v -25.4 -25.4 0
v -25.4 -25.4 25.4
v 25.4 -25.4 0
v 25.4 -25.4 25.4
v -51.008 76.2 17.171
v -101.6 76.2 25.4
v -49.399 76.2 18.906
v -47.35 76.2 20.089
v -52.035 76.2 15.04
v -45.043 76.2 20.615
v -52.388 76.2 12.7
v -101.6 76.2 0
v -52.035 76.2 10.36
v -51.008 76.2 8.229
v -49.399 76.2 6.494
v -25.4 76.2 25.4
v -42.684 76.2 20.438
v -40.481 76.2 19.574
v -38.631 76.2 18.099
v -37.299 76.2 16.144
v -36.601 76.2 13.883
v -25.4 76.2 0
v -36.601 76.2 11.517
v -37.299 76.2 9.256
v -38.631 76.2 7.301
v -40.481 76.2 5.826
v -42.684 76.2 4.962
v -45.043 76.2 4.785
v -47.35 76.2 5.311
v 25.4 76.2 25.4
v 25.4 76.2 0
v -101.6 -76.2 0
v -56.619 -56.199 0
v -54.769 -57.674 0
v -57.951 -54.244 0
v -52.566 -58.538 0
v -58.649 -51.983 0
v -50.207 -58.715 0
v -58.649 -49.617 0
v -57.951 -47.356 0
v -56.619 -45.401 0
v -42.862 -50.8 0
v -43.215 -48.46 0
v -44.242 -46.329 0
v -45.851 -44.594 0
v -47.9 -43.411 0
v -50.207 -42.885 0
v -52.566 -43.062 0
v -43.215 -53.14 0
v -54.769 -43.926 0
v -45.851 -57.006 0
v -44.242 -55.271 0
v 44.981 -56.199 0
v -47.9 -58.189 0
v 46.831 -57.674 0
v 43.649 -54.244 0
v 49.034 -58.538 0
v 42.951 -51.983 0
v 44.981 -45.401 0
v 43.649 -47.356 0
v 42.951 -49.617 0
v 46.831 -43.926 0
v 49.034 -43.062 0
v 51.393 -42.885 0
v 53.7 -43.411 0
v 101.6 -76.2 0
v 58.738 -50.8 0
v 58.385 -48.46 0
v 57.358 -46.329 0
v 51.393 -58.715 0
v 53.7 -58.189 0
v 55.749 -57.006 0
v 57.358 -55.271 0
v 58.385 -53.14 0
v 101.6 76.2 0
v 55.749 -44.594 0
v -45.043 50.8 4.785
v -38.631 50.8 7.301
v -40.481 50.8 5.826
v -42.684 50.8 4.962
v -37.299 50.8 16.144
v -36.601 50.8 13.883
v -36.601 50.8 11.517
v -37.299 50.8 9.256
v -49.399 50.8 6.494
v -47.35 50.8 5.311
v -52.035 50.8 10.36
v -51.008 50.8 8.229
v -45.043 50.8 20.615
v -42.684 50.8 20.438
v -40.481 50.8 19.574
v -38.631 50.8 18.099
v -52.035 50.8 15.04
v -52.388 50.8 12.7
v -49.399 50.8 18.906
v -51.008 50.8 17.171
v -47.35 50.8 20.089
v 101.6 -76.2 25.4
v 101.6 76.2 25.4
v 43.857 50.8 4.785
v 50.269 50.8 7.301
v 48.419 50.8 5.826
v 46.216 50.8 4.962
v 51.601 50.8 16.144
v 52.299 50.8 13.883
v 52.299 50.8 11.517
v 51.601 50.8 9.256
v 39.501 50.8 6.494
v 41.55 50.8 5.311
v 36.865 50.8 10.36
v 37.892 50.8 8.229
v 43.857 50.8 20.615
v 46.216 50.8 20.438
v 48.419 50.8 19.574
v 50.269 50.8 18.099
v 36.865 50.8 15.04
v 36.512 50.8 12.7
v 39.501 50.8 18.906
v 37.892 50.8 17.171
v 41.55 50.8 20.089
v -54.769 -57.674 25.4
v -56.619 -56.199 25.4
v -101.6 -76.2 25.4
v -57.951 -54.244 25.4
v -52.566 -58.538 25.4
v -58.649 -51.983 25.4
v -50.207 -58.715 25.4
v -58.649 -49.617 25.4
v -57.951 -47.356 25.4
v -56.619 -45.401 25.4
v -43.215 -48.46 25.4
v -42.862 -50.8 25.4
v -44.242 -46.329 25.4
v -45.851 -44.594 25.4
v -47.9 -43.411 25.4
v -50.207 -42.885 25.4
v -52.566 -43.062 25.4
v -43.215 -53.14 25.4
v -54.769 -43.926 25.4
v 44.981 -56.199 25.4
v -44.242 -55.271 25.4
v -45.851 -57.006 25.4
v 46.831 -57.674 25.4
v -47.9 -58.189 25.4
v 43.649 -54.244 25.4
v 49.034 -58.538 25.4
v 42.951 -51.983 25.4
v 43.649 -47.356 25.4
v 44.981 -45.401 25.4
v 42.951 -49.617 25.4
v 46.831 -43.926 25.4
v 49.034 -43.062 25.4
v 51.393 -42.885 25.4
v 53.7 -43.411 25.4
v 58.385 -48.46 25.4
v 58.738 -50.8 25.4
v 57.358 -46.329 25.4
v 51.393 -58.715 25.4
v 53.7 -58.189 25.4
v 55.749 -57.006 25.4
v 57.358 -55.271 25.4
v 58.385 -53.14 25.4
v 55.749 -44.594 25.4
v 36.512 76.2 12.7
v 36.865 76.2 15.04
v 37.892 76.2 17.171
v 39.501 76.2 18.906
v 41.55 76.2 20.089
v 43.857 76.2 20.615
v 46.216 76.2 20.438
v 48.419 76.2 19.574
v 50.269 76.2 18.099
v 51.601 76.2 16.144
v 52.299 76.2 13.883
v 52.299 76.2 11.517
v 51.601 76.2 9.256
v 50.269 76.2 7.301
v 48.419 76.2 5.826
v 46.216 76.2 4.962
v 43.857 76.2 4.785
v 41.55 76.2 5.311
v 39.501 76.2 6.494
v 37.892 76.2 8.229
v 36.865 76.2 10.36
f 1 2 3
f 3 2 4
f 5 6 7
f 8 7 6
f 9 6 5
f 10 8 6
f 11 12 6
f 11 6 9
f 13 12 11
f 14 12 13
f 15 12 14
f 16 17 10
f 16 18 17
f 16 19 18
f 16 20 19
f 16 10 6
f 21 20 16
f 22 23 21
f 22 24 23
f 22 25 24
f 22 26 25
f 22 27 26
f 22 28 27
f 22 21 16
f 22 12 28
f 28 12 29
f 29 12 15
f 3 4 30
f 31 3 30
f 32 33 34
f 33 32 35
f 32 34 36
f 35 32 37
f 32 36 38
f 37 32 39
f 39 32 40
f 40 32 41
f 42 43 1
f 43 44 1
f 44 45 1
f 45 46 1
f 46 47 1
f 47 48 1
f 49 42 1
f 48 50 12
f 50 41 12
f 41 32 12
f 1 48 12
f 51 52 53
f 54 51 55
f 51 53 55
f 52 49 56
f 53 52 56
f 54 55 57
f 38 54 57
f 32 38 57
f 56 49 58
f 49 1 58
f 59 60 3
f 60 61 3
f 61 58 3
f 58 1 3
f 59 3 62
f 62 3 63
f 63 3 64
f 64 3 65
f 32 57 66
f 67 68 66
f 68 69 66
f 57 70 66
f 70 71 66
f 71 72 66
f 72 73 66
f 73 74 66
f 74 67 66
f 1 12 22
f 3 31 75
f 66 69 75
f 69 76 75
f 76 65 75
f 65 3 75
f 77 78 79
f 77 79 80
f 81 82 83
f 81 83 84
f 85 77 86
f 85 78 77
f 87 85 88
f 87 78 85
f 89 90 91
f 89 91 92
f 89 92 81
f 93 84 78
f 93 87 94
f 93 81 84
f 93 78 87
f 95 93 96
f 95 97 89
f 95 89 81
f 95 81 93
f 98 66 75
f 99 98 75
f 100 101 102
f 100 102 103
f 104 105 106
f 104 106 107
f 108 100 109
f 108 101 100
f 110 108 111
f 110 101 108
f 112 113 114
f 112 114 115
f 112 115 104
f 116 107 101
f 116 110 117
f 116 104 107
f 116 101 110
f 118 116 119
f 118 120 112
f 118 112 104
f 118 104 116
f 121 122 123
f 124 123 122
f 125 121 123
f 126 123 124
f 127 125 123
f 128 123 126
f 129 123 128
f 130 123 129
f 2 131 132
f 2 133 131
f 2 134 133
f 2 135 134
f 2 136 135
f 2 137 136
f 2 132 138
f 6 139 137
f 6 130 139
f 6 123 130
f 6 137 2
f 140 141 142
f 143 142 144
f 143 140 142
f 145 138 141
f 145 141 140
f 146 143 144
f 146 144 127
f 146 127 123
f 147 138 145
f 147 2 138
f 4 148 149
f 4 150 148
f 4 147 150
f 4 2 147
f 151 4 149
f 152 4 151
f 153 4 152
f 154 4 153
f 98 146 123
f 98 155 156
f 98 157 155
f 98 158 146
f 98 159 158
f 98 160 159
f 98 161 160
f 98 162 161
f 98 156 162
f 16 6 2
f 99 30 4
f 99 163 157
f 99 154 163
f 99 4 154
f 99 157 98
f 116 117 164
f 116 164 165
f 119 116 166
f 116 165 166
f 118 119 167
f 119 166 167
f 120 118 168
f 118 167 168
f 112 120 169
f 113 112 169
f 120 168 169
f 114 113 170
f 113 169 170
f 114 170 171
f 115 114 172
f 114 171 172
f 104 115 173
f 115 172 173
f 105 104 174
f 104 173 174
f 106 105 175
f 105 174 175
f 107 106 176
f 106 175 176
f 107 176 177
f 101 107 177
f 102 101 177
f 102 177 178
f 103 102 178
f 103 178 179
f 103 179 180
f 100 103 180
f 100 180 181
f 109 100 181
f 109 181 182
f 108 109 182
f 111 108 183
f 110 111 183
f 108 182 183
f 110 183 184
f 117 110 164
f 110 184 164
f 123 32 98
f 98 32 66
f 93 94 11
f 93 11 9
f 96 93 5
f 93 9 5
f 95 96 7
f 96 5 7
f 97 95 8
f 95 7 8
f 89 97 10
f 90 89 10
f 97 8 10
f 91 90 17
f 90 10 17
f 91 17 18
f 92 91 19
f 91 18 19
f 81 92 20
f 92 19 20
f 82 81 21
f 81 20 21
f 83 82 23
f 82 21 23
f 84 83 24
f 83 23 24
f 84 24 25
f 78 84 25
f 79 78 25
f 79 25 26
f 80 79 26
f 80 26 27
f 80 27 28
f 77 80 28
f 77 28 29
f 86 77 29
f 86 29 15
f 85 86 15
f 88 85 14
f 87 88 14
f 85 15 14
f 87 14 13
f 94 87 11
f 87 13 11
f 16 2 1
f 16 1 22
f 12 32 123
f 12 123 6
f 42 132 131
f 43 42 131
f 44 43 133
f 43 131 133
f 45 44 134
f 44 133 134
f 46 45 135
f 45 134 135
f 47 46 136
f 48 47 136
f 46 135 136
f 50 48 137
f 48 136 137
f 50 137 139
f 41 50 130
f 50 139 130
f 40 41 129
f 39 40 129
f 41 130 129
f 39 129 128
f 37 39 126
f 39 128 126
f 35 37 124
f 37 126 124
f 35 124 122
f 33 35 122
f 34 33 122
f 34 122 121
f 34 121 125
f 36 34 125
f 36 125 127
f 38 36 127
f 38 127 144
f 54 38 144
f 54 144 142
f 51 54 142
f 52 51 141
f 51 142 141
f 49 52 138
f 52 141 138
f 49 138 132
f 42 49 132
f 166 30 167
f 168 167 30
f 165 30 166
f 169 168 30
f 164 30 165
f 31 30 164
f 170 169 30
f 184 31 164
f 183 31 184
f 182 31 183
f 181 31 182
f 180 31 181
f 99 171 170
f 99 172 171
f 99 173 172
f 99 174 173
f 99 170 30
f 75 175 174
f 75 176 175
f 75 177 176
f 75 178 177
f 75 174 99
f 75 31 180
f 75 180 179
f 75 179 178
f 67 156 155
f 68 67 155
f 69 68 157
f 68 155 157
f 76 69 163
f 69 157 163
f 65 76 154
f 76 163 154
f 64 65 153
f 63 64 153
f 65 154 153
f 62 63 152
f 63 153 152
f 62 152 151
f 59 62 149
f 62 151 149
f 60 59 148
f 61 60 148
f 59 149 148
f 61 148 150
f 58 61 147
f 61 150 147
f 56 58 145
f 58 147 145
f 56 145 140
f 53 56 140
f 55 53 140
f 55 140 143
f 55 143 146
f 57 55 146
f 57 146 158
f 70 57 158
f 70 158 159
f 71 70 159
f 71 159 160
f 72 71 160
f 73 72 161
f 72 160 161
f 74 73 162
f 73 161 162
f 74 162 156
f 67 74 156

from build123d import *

# Parameters (mm, degrees)
F0_W     = 203.2
F0_H     = 152.4
F0_R     = 7.9375
F1_DEPTH = 25.4
F2_W     = 50.8
F2_H     = 203.2
F3_DEPTH = 50.8
F4_R     = 7.9375
F5_DEPTH = 25.4
F6_R     = 7.9375
F7_DEPTH = 25.4


with BuildPart() as f1:
    # F0 (on Top) → F1 (new body)
    with BuildSketch(Plane.XY):
        Rectangle(F0_W, F0_H)
        Circle(F0_R, mode=Mode.SUBTRACT)
    extrude(amount=F1_DEPTH)

    # F2 (on face) → F3 (cut)
    with BuildSketch(Plane.XY.offset(25.4)):
        with Locations((0, 76.2)):
            Rectangle(F2_W, F2_H)
    extrude(amount=-F3_DEPTH, mode=Mode.SUBTRACT)

    # F4 (on face) → F5 (cut)
    with BuildSketch(Plane.XY.offset(25.4)):
        with Locations((-50.8, -50.8)):
            Circle(F4_R)
        with Locations((50.8, -50.8)):
            Circle(F4_R)
    extrude(amount=-F5_DEPTH, mode=Mode.SUBTRACT)

    # F6 (on face) → F7 (cut)
    with BuildSketch(Plane(origin=(0, 76.2, 0), x_dir=(-1, 0, 0), z_dir=(0, 1, 0))):
        with Locations((-44.45, 12.7)):
            Circle(F6_R)
        with Locations((44.45, 12.7)):
            Circle(F6_R)
    extrude(amount=-F7_DEPTH, mode=Mode.SUBTRACT)


solid = f1.part
